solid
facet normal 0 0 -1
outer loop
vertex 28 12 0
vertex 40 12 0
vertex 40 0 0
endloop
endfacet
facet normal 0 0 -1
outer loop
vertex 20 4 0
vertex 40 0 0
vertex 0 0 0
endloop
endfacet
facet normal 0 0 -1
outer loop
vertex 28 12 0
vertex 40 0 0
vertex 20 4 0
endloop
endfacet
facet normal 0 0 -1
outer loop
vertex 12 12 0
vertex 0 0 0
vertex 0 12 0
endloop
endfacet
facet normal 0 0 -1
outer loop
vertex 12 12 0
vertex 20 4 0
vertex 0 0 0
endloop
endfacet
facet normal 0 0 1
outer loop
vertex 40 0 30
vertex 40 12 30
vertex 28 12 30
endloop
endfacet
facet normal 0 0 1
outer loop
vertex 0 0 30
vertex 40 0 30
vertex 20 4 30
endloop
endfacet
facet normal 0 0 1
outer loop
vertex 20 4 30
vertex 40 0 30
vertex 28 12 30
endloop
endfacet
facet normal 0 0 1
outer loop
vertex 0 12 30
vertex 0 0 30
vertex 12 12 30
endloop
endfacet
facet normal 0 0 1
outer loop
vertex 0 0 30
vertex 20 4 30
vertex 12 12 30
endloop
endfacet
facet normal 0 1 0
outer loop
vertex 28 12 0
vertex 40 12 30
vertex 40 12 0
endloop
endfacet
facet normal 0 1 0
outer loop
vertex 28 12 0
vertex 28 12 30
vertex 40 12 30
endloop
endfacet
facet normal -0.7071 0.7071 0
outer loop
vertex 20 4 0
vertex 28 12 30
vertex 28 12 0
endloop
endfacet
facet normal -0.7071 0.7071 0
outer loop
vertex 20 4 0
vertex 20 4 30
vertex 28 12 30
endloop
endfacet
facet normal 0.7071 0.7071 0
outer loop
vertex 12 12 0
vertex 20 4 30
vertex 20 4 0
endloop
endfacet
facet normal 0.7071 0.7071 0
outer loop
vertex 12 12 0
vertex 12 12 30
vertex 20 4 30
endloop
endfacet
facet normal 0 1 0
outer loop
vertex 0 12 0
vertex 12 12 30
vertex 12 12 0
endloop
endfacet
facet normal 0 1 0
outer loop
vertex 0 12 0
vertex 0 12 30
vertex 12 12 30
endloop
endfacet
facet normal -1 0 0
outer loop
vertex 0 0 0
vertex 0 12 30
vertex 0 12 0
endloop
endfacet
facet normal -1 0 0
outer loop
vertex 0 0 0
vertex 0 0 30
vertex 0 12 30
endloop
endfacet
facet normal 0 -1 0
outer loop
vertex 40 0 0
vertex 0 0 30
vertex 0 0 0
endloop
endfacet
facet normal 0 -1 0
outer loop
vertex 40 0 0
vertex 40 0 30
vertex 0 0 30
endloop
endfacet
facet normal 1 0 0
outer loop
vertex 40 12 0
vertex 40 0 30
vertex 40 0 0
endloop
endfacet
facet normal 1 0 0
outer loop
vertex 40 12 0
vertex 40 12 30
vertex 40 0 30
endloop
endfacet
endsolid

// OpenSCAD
$fn = 32;

// ----------------------------------------------------------------------
// V guide rail: vway, 40 mm wide
// ----------------------------------------------------------------------

// --- parameters (mm) ---
rail_w = 40;              // rail width, X
base_t = 12;              // base plate thickness
v_depth = 8;              // V feature depth / height
v_half_w = 8;             // half width of the V at the base face
plate_t = 30;             // rail length, Z (the extrusion height)

profile = [[0, 0], [40, 0], [40, 12], [28, 12], [20, 4], [12, 12], [0, 12]];  // primary outline, 7 points, counter clockwise

// --- the one profile operation ---
linear_extrude(height = plate_t) polygon(points = profile);
